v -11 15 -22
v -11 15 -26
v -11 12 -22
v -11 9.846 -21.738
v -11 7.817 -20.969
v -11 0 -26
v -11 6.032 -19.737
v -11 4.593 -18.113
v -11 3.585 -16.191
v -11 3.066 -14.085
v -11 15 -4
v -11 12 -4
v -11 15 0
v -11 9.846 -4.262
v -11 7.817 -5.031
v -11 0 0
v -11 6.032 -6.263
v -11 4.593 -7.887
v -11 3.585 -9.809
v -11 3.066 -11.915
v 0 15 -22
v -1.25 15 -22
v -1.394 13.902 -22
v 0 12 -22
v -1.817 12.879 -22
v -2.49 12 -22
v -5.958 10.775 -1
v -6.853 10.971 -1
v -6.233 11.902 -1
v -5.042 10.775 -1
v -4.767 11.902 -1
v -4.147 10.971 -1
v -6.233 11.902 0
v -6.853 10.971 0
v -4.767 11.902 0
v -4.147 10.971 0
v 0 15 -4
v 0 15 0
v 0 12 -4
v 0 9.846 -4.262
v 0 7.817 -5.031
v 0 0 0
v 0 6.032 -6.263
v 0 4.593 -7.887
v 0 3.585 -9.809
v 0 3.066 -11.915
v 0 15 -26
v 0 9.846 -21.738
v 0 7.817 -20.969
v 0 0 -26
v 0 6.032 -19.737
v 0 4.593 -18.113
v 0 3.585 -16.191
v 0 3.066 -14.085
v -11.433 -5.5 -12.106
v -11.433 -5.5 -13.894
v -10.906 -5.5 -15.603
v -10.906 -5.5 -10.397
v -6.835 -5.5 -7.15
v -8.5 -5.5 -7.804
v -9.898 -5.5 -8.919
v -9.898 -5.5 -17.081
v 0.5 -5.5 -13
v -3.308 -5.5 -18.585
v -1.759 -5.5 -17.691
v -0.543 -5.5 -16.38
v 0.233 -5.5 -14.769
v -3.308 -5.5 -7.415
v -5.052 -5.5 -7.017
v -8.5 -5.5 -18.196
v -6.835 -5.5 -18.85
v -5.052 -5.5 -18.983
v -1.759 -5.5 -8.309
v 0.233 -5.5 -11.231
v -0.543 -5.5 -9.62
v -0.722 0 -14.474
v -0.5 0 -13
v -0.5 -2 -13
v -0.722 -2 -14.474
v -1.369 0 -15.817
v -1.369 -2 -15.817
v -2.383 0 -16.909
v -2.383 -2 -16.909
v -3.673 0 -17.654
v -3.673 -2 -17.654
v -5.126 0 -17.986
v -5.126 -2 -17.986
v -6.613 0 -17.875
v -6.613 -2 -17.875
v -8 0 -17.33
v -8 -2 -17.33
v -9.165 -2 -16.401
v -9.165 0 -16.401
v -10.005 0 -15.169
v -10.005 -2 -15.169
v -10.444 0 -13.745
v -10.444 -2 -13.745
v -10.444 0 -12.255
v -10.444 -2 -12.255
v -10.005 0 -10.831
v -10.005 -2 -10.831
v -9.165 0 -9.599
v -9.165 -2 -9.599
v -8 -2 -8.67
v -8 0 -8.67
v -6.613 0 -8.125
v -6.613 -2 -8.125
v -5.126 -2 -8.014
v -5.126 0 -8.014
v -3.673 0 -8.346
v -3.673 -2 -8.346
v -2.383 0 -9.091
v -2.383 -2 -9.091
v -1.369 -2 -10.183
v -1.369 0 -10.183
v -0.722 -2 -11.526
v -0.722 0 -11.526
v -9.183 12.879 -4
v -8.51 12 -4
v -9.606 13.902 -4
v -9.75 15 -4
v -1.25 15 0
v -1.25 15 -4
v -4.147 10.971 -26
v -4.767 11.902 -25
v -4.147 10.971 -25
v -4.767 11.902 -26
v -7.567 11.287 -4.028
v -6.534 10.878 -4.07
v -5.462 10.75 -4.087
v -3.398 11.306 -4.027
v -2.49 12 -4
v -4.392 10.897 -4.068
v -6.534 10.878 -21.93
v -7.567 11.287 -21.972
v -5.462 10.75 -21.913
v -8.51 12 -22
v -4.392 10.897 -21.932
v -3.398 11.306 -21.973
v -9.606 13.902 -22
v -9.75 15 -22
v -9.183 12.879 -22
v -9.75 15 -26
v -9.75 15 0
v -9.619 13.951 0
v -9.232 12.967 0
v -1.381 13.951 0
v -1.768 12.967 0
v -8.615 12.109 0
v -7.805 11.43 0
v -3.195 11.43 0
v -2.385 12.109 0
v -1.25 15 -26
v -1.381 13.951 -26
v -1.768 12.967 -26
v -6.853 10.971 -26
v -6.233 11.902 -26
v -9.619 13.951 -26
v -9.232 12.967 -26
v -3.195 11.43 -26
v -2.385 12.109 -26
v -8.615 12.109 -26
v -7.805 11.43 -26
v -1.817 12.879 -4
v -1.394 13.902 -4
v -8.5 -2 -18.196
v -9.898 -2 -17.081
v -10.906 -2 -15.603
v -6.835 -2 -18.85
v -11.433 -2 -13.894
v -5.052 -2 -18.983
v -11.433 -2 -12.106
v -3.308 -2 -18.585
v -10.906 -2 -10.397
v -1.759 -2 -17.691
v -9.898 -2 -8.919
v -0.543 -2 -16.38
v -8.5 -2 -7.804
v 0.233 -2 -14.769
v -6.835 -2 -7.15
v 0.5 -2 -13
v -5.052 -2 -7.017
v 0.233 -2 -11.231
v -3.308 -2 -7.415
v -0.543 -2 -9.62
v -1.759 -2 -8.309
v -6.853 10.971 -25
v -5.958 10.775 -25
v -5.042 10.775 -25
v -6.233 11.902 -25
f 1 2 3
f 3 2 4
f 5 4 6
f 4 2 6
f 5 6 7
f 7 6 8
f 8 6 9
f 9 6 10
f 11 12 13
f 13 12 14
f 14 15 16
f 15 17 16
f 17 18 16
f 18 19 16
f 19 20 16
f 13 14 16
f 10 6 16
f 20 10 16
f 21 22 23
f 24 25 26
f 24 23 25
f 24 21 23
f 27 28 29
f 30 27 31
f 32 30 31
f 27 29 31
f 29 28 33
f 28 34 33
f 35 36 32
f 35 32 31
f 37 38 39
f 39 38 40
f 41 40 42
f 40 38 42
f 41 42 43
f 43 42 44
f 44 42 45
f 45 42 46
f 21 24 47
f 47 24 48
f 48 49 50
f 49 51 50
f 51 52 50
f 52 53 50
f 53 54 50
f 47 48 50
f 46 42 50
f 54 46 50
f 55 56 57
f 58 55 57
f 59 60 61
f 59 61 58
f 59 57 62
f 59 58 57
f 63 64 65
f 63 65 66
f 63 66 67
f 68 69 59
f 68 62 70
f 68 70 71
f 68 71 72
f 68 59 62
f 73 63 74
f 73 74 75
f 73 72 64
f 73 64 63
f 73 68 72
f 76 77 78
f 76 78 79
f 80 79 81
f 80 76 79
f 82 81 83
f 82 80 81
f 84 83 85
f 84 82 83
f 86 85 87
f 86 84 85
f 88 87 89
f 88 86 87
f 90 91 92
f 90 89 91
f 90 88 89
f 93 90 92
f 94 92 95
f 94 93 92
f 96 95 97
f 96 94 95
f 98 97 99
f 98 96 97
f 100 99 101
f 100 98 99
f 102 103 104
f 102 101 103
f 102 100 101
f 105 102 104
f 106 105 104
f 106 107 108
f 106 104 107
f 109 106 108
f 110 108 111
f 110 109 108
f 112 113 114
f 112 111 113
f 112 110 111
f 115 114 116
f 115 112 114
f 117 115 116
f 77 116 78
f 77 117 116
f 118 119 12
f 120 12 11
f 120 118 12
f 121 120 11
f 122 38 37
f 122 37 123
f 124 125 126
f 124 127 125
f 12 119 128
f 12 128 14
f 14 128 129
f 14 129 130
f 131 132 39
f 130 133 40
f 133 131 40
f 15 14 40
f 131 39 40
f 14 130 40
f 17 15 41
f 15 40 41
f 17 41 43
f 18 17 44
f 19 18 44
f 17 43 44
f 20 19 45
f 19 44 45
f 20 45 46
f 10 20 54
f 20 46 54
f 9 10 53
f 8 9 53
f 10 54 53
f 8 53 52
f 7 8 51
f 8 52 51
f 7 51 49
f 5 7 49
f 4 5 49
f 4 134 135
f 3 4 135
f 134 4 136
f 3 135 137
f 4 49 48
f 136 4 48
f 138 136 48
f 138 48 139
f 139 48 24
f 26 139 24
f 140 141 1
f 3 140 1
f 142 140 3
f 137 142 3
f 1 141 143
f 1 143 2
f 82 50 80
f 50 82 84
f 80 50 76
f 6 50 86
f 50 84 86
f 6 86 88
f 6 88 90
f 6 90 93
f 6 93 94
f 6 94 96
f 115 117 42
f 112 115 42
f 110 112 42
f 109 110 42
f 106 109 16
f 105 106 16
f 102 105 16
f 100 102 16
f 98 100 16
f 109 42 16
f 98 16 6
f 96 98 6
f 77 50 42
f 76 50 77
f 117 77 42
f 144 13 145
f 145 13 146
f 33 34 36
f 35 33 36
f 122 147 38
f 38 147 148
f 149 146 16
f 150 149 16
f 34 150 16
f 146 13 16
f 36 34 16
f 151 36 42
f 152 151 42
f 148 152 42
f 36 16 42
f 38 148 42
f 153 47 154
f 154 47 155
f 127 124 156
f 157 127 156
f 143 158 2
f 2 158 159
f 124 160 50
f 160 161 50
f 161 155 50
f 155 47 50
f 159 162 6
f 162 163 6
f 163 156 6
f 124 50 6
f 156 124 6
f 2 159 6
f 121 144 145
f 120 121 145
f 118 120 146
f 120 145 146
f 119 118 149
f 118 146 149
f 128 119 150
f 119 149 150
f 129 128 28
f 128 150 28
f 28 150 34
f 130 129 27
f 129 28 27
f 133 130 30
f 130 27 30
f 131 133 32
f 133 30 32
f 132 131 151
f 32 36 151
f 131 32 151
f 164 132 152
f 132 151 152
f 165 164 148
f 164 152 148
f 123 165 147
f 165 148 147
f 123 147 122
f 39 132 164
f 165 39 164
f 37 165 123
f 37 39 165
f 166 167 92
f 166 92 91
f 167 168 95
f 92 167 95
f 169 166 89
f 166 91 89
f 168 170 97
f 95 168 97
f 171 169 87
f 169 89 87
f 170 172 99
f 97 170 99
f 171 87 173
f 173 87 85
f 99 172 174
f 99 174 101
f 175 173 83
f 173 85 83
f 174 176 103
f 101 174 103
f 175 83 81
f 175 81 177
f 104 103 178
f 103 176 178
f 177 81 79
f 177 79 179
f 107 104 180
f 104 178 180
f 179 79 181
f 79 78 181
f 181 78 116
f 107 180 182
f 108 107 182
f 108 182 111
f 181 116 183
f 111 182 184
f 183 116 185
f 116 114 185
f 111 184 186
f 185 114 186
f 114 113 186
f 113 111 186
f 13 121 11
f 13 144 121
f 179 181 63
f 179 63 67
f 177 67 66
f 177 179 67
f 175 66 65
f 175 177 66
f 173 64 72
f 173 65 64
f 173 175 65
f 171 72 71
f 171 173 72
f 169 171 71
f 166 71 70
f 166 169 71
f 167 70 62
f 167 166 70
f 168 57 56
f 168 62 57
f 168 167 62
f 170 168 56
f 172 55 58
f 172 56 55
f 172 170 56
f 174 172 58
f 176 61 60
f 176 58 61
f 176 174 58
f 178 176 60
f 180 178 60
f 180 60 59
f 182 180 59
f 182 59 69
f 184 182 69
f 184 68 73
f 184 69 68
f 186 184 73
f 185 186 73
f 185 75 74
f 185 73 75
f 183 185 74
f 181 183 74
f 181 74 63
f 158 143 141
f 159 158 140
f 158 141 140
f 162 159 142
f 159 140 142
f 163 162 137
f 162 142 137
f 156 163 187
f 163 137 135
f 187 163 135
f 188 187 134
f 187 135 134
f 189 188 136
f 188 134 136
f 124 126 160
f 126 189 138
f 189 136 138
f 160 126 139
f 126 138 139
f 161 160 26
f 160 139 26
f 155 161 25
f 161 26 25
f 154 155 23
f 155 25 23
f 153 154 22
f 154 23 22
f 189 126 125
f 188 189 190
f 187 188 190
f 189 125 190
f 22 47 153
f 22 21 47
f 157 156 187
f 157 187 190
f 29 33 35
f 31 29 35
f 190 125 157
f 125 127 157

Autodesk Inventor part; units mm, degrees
ref_plane "YZ Plane" through (0, 0, 0) normal (1, 0, 0) x (0, 1, 0)
ref_plane "XZ Plane" through (0, 0, 0) normal (0, 1, 0) x (-1, 0, 0)
ref_plane "XY Plane" through (0, 0, 0) normal (0, 0, 1) x (1, 0, 0)
sketch "Sketch2" plane through (0, 0, 0) normal (0, 1, 0) x (-1, 0, 0)
  line L0 (0, 0) -> (0, -26)
  line L1 (0, -26) -> (11, -26)
  line L2 (11, -26) -> (11, 0)
  line L3 (11, 0) -> (0, 0)
  dimension "d2" = 26
  dimension "d3" = 11
extrude "Extrusion1" add sketch "Sketch2" along normal blind 15
sketch "Sketch3" plane through (-11, 0, 0) normal (0, 0, 1) x (1, 0, 0)
  line L0 (0, 0) -> (11, 0) projected
  line L1 (11, 0) -> (11, 15) projected
  line L2 (0, 15) -> (11, 15) projected
  line L3 (0, 0) -> (0, 15) projected
  line L4 (11, 15) -> (0, 15) projected
  circle A0 centre (5.5, 15) radius 4.25
  point P0 (9.75, 15)
  point P1 (1.25, 15)
  dimension "d6" = 8.5
extrude "Extrusion2" cut sketch "Sketch3" against normal blind 32.25 contours L2 A0 picked at (4.2044, 14.0026)
sketch "Sketch4" plane through (0, 0, 0) normal (1, 0, 0) x (0, 0, -1)
  line L0 (0, 0) -> (26, 0) projected
  line L1 (26, 0) -> (26, 15) projected
  line L2 (0, 15) -> (26, 15) projected
  line L3 (0, 0) -> (0, 15) projected
  line L4 (0, 15) -> (4, 15)
  line L5 (0, 15) -> (26, 15) projected
  line L6 (26, 15) -> (22, 15)
  line L7 (22, 15) -> (22, 12)
  line L8 (0, 10.75) -> (26, 10.75) projected
  line L9 (22, 12) -> (4, 12)
  line L10 (4, 12) -> (4, 15)
  line L11 (26, 0) -> (0, 0) projected
  line L12 (13, 0) -> (13, 3)
  arc A0 (4, 12) -> (22, 12) centre (13, 12) ccw
  dimension "d9" = 4
  dimension "d10" = 4
  dimension "d11" = 3
  dimension "d12" = 3
extrude "Extrusion3" cut sketch "Sketch4" against normal blind 32.25 contours A0 L8 | A0 L9 L8 | L2 L7 L9 L10
sketch "Sketch5" plane through (-11, 0, 0) normal (0, 0, 1) x (1, 0, 0)
  arc A0 (1.25, 15) -> (9.75, 15) centre (5.5, 15) ccw projected
  line L0 (0, 15) -> (1.25, 15) projected
  line L1 (0, 0) -> (0, 15) projected
  line L2 (0, 0) -> (11, 0) projected
  line L3 (11, 0) -> (11, 15) projected
  line L4 (9.75, 15) -> (11, 15) projected
  arc A1 (1.25, 15) -> (9.75, 15) centre (5.5, 15) ccw projected
  line L5 (5.5, 10.75) -> (7, 10.75)
  line L6 (7, 10.75) -> (4, 10.75)
  line L7 (4, 10.75) -> (4.7672, 11.9025)
  line L8 (4.7672, 11.9025) -> (5.5, 11.9025)
  line L9 (5.5, 11.9025) -> (5.5, 10.75)
  line L10 (7, 10.75) -> (6.2328, 11.9025)
  line L11 (6.2328, 11.9025) -> (5.5, 11.9025)
  arc A2 (1.25, 15) -> (9.75, 15) centre (5.5, 15) ccw projected
  line L12 (11, 15) -> (9.75, 15) projected
  line L13 (11, 0) -> (11, 15) projected
  line L14 (11, 0) -> (0, 0) projected
  line L15 (0, 0) -> (0, 15) projected
  line L16 (1.25, 15) -> (0, 15) projected
  line L17 (5.5, 10.75) -> (4, 10.75)
  line L18 (4, 10.75) -> (4.7672, 11.9025)
  line L19 (6.2328, 11.9025) -> (6.1284, 11.9025)
  line L20 (6.2328, 11.9025) -> (4.7672, 11.9025)
  line L21 (6.2328, 11.9025) -> (7, 10.75)
  line L22 (7, 10.75) -> (4, 10.75)
  arc A3 (1.25, 15) -> (9.75, 15) centre (5.5, 15) ccw projected
  line L23 (11, 15) -> (9.75, 15) projected
  line L24 (11, 0) -> (11, 15) projected
  line L25 (11, 0) -> (0, 0) projected
  line L26 (0, 0) -> (0, 15) projected
  line L27 (1.25, 15) -> (0, 15) projected
  arc A4 (1.25, 15) -> (9.75, 15) centre (5.5, 15) ccw projected
  line L28 (11, 15) -> (9.75, 15) projected
  line L29 (11, 0) -> (11, 15) projected
  line L30 (11, 0) -> (0, 0) projected
  line L31 (0, 0) -> (0, 15) projected
  line L32 (1.25, 15) -> (0, 15) projected
  point P0 (4.1472, 10.9711)
  point P1 (6.8528, 10.9711)
  dimension "d15" = 1.5
  dimension "d16" = 3
extrude "Extrusion4" add sketch "Sketch5" against normal blind 1 contours L7 L8 L9 A0 | L9 L11 L10 A0
sketch "Sketch6" plane through (0, 0, -26) normal (0, 0, -1) x (-1, 0, 0)
  arc A0 (1.25, 15) -> (9.75, 15) centre (5.5, 15) ccw projected
  line L0 (0, 15) -> (1.25, 15) projected
  line L1 (0, 0) -> (0, 15) projected
  line L2 (0, 0) -> (11, 0) projected
  line L3 (11, 0) -> (11, 15) projected
  line L4 (9.75, 15) -> (11, 15) projected
  arc A1 (4.1472, 10.9711) -> (6.8528, 10.9711) centre (5.5, 15) ccw projected
  line L5 (5.5, 10.75) -> (7, 10.75)
  line L6 (4.7672, 11.9025) -> (6.2328, 11.9025) projected
  line L7 (7, 10.75) -> (6.2328, 11.9025)
  line L8 (6.2328, 11.9025) -> (4.7672, 11.9025)
  line L9 (4.7672, 11.9025) -> (4, 10.75)
  line L10 (4.7672, 11.9025) -> (4.1472, 10.9711) projected
  line L11 (4, 10.75) -> (5.5, 10.75)
  point P0 (0, 0)
  point P1 (6.8528, 10.9711)
  dimension "d19" = 1.5
extrude "Extrusion5" add sketch "Sketch6" against normal blind 1 contours L9 L6 L7 A0
sketch "Sketch7" plane through (0, 0, 0) normal (0, -1, 0) x (1, 0, 0)
  line L0 (0, -26) -> (-11, -26) projected
  line L1 (0, 0) -> (0, -26) projected
  line L2 (-11, 0) -> (0, 0) projected
  line L3 (-11, -26) -> (-11, 0) projected
  circle A0 centre (-5.5, -13) radius 5
  dimension "d22" = 10
extrude "Extrusion6" add sketch "Sketch7" along normal blind 2 contours A0
sketch "Sketch8" plane through (-5.5, -2, -13) normal (0, -1, 0) x (1, 0, 0)
  circle A0 centre (0, 0) radius 6
  point P0 (5.5, 13)
  dimension "d25" = 12
extrude "Extrusion7" add sketch "Sketch8" along normal blind 3.5
